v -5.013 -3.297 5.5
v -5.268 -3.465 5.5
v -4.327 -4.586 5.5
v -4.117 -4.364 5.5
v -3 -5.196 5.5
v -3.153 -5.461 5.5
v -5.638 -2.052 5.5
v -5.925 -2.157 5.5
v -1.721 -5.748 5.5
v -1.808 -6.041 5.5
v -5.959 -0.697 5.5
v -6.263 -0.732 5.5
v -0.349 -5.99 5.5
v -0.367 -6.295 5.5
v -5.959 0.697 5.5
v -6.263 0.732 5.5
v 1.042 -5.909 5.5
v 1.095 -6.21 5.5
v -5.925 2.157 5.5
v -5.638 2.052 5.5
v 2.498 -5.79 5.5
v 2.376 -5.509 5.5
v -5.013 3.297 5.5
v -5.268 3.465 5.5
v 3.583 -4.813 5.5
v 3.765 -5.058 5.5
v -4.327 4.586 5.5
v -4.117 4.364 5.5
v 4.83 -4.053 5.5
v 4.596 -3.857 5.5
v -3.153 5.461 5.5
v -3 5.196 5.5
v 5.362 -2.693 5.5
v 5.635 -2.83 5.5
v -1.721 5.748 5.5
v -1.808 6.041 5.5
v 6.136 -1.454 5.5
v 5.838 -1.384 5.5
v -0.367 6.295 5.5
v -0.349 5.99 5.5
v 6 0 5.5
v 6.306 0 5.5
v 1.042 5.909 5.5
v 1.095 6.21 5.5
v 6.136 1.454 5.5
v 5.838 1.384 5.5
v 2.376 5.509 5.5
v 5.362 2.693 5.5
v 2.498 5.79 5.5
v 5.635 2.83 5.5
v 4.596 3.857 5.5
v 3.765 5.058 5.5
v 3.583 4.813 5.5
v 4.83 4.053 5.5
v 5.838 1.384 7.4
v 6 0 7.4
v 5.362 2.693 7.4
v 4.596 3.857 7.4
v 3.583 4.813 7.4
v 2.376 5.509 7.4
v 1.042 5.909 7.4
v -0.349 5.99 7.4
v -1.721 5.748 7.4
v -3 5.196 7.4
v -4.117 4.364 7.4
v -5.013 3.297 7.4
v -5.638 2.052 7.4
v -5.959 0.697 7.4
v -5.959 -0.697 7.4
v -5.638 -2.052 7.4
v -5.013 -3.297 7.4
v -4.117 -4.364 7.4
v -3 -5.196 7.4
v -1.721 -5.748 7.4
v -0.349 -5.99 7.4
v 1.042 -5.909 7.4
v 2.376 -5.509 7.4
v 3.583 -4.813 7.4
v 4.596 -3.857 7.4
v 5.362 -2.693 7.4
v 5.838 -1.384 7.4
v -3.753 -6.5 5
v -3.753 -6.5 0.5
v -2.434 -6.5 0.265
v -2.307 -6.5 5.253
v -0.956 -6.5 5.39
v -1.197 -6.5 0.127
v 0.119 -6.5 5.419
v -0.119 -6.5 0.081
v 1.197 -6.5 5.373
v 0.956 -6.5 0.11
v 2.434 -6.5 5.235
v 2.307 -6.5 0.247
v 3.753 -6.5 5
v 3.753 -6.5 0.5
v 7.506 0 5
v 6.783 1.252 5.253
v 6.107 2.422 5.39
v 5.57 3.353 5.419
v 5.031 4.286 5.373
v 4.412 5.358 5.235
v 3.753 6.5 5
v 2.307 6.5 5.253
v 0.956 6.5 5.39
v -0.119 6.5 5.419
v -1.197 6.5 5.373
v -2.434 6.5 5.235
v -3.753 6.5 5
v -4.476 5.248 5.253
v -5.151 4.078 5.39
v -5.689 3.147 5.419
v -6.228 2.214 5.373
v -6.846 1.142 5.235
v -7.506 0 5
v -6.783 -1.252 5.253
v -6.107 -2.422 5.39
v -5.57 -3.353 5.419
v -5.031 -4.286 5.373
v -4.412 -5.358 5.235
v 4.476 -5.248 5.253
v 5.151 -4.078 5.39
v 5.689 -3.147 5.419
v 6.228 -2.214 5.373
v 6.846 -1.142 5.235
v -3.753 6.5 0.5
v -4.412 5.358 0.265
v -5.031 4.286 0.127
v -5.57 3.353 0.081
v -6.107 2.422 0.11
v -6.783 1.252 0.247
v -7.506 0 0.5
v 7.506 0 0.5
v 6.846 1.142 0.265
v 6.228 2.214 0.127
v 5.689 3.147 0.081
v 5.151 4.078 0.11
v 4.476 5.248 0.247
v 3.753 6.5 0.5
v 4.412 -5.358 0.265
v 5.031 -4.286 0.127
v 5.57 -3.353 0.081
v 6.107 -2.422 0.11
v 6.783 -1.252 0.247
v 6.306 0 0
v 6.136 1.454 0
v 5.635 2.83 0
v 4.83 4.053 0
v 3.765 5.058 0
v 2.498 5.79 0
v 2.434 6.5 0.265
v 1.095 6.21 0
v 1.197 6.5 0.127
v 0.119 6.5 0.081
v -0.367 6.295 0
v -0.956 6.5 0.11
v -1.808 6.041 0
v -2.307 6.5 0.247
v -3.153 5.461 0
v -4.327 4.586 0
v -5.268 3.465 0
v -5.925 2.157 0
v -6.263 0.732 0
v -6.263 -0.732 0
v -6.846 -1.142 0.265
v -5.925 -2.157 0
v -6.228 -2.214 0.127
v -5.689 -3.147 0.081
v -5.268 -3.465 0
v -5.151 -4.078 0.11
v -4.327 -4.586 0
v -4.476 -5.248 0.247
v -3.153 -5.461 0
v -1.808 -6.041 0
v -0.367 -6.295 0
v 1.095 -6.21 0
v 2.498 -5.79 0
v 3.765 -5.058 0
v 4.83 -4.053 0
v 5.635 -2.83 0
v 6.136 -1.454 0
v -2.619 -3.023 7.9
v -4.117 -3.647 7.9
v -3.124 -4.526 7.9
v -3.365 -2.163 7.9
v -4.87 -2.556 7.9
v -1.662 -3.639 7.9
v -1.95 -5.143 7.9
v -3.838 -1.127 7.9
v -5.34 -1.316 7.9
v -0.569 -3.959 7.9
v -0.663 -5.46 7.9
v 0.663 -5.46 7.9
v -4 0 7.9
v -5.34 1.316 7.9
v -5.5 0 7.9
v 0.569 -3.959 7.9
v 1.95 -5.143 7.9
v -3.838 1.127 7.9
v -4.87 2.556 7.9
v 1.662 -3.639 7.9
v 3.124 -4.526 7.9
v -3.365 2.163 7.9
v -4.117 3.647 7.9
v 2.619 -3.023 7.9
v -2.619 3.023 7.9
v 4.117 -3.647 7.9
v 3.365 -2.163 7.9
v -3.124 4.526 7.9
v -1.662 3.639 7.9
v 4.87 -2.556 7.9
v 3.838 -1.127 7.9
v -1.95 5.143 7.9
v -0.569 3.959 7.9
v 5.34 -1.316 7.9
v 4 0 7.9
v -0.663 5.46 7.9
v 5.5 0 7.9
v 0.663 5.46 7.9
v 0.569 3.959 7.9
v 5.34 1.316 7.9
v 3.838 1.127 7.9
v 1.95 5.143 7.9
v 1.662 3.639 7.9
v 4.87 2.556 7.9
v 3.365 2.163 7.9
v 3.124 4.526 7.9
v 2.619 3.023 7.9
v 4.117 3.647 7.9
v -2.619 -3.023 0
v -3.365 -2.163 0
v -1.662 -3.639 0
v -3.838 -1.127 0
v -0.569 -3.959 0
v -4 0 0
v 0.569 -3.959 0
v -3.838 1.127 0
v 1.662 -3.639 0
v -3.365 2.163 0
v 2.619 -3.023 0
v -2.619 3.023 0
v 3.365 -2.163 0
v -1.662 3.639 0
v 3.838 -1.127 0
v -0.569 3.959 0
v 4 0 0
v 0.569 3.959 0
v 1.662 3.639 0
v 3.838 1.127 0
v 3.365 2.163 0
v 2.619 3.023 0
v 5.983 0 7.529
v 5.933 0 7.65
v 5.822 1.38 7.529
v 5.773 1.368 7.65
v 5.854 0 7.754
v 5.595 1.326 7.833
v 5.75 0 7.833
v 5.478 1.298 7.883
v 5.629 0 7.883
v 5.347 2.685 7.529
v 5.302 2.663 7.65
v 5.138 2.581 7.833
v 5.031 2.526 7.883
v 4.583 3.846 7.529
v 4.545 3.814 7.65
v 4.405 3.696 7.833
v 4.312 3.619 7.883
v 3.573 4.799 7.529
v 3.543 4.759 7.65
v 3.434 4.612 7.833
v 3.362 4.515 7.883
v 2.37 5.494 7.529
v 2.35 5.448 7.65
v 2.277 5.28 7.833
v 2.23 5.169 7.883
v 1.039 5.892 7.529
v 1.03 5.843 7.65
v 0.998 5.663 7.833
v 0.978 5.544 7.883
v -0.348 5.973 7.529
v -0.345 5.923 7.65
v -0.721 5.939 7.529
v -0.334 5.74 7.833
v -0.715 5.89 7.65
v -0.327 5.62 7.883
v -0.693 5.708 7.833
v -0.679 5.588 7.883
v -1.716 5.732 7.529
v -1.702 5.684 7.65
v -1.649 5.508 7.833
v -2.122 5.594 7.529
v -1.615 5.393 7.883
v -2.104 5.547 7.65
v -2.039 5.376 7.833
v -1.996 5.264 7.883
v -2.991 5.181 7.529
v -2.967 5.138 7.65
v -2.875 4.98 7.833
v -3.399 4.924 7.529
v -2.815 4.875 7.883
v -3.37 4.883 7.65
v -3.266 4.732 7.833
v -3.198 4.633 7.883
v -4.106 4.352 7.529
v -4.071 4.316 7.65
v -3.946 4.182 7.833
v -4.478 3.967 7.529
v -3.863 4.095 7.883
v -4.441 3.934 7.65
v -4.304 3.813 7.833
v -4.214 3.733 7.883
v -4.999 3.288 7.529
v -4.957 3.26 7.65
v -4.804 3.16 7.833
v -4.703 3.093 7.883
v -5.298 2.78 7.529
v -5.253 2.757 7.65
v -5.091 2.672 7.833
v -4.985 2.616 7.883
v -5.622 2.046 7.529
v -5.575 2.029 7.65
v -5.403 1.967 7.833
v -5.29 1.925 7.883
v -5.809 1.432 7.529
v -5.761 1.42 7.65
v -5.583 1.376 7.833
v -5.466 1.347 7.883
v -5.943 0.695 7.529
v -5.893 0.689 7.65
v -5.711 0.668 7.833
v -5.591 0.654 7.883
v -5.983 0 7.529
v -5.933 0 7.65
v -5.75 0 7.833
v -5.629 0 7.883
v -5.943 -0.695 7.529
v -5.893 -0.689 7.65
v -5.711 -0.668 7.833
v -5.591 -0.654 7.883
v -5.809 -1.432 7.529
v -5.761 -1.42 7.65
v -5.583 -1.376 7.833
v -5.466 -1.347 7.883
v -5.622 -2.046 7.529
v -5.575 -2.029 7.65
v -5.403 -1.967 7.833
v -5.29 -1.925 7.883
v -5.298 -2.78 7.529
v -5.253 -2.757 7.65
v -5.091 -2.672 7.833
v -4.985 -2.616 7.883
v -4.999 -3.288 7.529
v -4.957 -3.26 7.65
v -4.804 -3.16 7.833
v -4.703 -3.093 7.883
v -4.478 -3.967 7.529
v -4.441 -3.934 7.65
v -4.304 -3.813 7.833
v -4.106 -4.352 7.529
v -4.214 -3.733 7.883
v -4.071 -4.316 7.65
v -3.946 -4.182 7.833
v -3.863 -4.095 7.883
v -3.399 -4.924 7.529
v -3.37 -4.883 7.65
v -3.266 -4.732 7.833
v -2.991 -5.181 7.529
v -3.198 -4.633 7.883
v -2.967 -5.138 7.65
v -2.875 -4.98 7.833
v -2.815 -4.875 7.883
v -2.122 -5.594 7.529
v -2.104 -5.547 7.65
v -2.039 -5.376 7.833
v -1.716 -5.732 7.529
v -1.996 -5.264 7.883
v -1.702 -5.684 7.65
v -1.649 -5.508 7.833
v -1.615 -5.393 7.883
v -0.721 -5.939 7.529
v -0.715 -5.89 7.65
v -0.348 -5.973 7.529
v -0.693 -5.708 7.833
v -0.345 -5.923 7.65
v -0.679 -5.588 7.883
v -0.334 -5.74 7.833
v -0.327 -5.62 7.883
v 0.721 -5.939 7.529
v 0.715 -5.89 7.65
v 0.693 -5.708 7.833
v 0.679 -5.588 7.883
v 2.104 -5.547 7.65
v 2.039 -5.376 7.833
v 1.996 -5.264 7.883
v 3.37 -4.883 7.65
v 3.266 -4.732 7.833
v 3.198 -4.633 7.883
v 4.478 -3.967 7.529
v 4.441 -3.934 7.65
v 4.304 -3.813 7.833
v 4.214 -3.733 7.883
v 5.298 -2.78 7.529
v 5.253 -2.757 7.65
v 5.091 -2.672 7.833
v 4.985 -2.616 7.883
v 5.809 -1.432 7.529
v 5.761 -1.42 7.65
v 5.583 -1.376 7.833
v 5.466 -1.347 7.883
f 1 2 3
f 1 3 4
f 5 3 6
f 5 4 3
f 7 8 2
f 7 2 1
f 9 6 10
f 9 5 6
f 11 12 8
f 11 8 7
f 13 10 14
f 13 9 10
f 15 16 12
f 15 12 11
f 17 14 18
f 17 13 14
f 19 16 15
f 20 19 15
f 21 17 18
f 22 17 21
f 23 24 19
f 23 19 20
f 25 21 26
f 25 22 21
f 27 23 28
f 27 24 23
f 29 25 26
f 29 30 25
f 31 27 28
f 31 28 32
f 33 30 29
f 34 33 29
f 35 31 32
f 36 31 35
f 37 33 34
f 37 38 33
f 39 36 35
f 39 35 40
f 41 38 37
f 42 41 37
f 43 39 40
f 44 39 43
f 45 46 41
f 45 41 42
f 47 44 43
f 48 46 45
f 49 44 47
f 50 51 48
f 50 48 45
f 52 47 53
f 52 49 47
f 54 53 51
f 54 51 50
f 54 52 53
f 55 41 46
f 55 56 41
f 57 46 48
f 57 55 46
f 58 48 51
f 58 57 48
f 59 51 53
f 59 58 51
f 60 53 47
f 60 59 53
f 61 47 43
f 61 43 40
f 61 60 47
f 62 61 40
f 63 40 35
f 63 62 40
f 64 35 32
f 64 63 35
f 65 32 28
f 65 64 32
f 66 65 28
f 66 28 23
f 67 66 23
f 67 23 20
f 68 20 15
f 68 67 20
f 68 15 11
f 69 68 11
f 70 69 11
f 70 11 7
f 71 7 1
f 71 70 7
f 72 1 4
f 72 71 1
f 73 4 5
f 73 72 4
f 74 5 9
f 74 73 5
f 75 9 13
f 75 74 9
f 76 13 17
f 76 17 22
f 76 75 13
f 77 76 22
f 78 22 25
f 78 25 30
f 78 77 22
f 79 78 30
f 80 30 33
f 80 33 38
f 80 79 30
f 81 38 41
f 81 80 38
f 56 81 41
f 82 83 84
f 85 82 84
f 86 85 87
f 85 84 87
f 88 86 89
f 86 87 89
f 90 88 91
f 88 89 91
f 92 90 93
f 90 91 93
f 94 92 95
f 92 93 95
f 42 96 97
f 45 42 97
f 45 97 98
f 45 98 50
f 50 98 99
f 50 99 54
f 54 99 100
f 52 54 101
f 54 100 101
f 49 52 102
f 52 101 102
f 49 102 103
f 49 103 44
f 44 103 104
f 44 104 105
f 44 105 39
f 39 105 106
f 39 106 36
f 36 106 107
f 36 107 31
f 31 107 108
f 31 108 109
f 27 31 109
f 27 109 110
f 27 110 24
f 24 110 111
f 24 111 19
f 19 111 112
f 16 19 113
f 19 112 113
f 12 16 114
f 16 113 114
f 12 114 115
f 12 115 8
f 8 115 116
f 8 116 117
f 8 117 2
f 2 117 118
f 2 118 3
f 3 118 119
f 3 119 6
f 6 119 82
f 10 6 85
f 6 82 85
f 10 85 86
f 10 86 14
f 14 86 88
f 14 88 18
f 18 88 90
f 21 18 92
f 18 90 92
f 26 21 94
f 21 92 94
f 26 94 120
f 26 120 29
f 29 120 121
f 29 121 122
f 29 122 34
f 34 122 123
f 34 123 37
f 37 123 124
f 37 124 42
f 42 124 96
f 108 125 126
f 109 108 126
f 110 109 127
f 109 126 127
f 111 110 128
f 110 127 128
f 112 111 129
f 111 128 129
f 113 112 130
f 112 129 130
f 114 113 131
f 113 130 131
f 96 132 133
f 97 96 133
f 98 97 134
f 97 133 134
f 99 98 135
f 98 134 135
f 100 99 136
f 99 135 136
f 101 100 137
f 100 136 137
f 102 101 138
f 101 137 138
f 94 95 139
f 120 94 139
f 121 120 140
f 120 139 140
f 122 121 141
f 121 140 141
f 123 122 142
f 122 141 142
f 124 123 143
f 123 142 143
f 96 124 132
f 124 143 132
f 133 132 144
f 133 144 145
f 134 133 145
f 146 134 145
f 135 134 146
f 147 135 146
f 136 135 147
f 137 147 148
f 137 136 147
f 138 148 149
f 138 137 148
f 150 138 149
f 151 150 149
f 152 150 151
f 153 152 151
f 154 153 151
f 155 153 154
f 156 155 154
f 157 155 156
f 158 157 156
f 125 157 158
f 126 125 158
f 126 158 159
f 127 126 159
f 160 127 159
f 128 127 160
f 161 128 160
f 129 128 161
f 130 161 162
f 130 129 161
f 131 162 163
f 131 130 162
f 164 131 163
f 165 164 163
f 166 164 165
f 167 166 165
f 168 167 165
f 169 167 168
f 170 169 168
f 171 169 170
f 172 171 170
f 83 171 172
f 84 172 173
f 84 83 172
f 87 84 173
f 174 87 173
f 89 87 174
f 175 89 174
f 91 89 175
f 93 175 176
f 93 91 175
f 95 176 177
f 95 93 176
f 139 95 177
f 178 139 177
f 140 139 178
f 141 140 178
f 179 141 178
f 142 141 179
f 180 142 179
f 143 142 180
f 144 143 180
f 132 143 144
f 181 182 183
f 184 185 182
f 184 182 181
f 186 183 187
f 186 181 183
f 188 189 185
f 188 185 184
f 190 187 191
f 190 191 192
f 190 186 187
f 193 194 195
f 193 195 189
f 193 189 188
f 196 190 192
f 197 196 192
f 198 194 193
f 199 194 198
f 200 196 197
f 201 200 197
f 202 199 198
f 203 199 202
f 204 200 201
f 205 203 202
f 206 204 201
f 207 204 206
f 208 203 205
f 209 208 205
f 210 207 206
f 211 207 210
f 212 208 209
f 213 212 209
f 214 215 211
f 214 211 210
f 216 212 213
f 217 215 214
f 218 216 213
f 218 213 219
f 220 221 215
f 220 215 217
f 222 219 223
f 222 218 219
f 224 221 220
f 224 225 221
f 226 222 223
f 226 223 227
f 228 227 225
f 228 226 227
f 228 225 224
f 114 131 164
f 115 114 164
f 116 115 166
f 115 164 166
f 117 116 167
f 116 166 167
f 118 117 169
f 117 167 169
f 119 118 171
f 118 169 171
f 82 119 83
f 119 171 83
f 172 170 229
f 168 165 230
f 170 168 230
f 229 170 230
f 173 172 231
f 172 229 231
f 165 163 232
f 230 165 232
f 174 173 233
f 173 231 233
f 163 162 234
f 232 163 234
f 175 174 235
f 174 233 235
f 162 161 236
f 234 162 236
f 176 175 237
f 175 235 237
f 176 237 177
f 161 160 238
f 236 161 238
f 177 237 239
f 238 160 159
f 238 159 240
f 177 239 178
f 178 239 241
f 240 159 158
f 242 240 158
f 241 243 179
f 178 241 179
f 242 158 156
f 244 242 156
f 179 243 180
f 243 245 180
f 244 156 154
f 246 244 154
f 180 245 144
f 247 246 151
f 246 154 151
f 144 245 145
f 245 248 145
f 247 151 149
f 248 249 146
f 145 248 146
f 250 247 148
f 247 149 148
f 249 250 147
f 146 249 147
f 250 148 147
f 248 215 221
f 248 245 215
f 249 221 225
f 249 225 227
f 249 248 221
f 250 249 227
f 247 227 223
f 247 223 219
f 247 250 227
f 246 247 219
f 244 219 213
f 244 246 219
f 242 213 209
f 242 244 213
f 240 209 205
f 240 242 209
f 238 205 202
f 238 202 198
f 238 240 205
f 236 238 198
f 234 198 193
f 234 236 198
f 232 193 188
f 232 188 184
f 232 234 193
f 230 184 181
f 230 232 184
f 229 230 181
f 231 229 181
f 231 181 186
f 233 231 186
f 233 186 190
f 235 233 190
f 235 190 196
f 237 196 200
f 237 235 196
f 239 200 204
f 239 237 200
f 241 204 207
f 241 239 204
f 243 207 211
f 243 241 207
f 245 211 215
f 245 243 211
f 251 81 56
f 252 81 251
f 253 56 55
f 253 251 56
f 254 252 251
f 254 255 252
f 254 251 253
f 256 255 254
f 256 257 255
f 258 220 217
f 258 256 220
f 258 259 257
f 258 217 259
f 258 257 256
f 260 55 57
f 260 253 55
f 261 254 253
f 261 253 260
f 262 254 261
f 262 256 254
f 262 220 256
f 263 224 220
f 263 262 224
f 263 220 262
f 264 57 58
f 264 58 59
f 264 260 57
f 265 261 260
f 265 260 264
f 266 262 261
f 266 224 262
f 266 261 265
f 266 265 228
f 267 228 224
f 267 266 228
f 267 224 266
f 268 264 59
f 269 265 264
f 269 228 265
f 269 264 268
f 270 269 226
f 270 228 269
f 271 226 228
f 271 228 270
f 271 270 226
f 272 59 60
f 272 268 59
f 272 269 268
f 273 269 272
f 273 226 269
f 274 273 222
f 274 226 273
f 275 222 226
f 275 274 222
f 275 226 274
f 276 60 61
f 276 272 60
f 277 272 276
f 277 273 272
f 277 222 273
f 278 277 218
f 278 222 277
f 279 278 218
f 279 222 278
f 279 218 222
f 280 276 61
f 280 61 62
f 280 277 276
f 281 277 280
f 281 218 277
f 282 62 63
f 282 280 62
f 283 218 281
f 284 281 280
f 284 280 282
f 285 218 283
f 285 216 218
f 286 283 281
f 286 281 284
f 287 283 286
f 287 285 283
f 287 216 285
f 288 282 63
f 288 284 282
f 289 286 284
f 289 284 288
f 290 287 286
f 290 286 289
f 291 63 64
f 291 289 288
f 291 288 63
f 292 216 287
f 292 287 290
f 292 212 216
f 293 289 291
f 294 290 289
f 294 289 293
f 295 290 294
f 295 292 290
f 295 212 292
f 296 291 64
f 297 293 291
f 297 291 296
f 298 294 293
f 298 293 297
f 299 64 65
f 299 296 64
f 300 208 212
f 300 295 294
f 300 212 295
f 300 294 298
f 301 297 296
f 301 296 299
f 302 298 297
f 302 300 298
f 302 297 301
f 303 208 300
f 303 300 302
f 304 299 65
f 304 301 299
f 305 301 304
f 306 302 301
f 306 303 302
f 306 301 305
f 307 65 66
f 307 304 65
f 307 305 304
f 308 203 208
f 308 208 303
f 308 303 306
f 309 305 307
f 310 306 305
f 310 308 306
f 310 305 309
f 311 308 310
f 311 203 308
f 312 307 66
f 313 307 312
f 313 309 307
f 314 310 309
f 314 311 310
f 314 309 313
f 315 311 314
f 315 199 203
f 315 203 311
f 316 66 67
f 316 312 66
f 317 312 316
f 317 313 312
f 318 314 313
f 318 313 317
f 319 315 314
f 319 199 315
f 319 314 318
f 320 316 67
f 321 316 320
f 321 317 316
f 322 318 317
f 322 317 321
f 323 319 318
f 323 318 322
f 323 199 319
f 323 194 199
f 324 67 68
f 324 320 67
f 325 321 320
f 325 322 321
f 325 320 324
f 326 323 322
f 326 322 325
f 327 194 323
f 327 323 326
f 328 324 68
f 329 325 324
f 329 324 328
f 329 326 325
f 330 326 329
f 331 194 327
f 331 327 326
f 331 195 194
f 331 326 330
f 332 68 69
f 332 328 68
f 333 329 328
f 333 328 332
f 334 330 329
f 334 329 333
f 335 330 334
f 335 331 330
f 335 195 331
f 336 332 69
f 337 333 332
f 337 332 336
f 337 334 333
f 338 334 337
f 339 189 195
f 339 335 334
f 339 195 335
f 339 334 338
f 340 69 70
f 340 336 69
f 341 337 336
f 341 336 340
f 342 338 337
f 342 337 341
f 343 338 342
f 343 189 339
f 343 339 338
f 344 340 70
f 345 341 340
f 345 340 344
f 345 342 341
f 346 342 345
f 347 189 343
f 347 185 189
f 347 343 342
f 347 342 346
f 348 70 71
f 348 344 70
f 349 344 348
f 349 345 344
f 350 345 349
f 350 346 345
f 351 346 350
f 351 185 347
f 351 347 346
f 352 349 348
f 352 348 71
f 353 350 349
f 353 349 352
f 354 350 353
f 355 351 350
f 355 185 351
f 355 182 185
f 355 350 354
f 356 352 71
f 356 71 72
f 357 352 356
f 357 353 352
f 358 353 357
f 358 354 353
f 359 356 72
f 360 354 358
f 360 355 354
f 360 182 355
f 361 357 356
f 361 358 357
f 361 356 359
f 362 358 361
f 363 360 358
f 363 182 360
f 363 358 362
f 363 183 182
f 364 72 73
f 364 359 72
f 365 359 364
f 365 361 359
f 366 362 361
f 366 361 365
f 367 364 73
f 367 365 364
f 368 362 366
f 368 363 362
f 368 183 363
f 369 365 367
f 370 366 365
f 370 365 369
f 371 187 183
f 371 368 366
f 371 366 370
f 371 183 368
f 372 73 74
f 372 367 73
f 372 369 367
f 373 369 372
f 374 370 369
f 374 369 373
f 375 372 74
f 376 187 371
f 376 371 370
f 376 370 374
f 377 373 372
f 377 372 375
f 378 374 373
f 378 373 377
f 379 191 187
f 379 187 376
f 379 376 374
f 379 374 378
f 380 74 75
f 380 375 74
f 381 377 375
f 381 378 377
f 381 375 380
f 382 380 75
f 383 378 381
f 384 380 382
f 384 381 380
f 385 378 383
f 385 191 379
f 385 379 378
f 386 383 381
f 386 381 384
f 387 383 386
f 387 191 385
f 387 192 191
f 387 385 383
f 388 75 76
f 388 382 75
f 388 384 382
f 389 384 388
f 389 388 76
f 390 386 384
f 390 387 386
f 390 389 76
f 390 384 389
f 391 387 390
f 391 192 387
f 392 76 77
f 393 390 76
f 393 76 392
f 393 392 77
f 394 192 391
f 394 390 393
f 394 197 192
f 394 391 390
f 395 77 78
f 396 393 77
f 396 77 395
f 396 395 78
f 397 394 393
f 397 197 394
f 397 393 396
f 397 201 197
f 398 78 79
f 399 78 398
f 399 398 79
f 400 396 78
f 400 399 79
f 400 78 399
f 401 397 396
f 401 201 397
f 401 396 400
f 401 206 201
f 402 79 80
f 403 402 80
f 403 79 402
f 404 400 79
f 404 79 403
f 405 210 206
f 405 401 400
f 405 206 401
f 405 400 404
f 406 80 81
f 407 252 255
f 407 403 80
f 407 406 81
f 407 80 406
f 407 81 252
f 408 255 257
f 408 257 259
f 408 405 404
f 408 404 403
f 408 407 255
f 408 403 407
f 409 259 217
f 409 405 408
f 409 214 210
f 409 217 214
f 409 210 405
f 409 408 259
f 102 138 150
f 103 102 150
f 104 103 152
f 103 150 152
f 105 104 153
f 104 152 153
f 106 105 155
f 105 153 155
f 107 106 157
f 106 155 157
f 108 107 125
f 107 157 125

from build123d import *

# Parameters (mm, degrees)
SKETCH007_R  = 4
PAD004_DEPTH = 5.5


with BuildPart() as part:
    # Sketch007 → Pad004 (new body)
    with BuildSketch(Plane.XY):
        Polygon((7.5055534995, 0), (3.7527767497, 6.5), (-3.7527767497, 6.5), (-7.5055534995, 0), (-3.7527767497, -6.5), (3.7527767497, -6.5), align=None)
        Circle(SKETCH007_R, mode=Mode.SUBTRACT)
    extrude(amount=PAD004_DEPTH)

    # Sketch008 → Revolution (revolve)
    with BuildSketch(Plane.XZ):
        with BuildLine():
            Line((4, 5.5), (6, 5.5))
            Line((6, 5.5), (6, 7.4))
            ThreePointArc((6, 7.4), (5.8535533906, 7.7535533906), (5.5, 7.9))
            Line((5.5, 7.9), (4, 7.9))
            Line((4, 7.9), (4, 5.5))
        make_face()
    revolve(axis=Axis((0, 0, 0), (0, 0, 1)))

    # Sketch009 → Groove001 (revolve, cut)
    with BuildSketch(Plane.XZ):
        Polygon((7.5055534995, 5.5), (6.3055534995, 5.5), (7.5055534995, 5), align=None)
        Polygon((7.5055534995, 0), (6.3055534995, 0), (7.5055534995, 0.5), align=None)
    revolve(axis=Axis((0, 0, 0), (0, 0, 1)), mode=Mode.SUBTRACT)


solid = part.part
